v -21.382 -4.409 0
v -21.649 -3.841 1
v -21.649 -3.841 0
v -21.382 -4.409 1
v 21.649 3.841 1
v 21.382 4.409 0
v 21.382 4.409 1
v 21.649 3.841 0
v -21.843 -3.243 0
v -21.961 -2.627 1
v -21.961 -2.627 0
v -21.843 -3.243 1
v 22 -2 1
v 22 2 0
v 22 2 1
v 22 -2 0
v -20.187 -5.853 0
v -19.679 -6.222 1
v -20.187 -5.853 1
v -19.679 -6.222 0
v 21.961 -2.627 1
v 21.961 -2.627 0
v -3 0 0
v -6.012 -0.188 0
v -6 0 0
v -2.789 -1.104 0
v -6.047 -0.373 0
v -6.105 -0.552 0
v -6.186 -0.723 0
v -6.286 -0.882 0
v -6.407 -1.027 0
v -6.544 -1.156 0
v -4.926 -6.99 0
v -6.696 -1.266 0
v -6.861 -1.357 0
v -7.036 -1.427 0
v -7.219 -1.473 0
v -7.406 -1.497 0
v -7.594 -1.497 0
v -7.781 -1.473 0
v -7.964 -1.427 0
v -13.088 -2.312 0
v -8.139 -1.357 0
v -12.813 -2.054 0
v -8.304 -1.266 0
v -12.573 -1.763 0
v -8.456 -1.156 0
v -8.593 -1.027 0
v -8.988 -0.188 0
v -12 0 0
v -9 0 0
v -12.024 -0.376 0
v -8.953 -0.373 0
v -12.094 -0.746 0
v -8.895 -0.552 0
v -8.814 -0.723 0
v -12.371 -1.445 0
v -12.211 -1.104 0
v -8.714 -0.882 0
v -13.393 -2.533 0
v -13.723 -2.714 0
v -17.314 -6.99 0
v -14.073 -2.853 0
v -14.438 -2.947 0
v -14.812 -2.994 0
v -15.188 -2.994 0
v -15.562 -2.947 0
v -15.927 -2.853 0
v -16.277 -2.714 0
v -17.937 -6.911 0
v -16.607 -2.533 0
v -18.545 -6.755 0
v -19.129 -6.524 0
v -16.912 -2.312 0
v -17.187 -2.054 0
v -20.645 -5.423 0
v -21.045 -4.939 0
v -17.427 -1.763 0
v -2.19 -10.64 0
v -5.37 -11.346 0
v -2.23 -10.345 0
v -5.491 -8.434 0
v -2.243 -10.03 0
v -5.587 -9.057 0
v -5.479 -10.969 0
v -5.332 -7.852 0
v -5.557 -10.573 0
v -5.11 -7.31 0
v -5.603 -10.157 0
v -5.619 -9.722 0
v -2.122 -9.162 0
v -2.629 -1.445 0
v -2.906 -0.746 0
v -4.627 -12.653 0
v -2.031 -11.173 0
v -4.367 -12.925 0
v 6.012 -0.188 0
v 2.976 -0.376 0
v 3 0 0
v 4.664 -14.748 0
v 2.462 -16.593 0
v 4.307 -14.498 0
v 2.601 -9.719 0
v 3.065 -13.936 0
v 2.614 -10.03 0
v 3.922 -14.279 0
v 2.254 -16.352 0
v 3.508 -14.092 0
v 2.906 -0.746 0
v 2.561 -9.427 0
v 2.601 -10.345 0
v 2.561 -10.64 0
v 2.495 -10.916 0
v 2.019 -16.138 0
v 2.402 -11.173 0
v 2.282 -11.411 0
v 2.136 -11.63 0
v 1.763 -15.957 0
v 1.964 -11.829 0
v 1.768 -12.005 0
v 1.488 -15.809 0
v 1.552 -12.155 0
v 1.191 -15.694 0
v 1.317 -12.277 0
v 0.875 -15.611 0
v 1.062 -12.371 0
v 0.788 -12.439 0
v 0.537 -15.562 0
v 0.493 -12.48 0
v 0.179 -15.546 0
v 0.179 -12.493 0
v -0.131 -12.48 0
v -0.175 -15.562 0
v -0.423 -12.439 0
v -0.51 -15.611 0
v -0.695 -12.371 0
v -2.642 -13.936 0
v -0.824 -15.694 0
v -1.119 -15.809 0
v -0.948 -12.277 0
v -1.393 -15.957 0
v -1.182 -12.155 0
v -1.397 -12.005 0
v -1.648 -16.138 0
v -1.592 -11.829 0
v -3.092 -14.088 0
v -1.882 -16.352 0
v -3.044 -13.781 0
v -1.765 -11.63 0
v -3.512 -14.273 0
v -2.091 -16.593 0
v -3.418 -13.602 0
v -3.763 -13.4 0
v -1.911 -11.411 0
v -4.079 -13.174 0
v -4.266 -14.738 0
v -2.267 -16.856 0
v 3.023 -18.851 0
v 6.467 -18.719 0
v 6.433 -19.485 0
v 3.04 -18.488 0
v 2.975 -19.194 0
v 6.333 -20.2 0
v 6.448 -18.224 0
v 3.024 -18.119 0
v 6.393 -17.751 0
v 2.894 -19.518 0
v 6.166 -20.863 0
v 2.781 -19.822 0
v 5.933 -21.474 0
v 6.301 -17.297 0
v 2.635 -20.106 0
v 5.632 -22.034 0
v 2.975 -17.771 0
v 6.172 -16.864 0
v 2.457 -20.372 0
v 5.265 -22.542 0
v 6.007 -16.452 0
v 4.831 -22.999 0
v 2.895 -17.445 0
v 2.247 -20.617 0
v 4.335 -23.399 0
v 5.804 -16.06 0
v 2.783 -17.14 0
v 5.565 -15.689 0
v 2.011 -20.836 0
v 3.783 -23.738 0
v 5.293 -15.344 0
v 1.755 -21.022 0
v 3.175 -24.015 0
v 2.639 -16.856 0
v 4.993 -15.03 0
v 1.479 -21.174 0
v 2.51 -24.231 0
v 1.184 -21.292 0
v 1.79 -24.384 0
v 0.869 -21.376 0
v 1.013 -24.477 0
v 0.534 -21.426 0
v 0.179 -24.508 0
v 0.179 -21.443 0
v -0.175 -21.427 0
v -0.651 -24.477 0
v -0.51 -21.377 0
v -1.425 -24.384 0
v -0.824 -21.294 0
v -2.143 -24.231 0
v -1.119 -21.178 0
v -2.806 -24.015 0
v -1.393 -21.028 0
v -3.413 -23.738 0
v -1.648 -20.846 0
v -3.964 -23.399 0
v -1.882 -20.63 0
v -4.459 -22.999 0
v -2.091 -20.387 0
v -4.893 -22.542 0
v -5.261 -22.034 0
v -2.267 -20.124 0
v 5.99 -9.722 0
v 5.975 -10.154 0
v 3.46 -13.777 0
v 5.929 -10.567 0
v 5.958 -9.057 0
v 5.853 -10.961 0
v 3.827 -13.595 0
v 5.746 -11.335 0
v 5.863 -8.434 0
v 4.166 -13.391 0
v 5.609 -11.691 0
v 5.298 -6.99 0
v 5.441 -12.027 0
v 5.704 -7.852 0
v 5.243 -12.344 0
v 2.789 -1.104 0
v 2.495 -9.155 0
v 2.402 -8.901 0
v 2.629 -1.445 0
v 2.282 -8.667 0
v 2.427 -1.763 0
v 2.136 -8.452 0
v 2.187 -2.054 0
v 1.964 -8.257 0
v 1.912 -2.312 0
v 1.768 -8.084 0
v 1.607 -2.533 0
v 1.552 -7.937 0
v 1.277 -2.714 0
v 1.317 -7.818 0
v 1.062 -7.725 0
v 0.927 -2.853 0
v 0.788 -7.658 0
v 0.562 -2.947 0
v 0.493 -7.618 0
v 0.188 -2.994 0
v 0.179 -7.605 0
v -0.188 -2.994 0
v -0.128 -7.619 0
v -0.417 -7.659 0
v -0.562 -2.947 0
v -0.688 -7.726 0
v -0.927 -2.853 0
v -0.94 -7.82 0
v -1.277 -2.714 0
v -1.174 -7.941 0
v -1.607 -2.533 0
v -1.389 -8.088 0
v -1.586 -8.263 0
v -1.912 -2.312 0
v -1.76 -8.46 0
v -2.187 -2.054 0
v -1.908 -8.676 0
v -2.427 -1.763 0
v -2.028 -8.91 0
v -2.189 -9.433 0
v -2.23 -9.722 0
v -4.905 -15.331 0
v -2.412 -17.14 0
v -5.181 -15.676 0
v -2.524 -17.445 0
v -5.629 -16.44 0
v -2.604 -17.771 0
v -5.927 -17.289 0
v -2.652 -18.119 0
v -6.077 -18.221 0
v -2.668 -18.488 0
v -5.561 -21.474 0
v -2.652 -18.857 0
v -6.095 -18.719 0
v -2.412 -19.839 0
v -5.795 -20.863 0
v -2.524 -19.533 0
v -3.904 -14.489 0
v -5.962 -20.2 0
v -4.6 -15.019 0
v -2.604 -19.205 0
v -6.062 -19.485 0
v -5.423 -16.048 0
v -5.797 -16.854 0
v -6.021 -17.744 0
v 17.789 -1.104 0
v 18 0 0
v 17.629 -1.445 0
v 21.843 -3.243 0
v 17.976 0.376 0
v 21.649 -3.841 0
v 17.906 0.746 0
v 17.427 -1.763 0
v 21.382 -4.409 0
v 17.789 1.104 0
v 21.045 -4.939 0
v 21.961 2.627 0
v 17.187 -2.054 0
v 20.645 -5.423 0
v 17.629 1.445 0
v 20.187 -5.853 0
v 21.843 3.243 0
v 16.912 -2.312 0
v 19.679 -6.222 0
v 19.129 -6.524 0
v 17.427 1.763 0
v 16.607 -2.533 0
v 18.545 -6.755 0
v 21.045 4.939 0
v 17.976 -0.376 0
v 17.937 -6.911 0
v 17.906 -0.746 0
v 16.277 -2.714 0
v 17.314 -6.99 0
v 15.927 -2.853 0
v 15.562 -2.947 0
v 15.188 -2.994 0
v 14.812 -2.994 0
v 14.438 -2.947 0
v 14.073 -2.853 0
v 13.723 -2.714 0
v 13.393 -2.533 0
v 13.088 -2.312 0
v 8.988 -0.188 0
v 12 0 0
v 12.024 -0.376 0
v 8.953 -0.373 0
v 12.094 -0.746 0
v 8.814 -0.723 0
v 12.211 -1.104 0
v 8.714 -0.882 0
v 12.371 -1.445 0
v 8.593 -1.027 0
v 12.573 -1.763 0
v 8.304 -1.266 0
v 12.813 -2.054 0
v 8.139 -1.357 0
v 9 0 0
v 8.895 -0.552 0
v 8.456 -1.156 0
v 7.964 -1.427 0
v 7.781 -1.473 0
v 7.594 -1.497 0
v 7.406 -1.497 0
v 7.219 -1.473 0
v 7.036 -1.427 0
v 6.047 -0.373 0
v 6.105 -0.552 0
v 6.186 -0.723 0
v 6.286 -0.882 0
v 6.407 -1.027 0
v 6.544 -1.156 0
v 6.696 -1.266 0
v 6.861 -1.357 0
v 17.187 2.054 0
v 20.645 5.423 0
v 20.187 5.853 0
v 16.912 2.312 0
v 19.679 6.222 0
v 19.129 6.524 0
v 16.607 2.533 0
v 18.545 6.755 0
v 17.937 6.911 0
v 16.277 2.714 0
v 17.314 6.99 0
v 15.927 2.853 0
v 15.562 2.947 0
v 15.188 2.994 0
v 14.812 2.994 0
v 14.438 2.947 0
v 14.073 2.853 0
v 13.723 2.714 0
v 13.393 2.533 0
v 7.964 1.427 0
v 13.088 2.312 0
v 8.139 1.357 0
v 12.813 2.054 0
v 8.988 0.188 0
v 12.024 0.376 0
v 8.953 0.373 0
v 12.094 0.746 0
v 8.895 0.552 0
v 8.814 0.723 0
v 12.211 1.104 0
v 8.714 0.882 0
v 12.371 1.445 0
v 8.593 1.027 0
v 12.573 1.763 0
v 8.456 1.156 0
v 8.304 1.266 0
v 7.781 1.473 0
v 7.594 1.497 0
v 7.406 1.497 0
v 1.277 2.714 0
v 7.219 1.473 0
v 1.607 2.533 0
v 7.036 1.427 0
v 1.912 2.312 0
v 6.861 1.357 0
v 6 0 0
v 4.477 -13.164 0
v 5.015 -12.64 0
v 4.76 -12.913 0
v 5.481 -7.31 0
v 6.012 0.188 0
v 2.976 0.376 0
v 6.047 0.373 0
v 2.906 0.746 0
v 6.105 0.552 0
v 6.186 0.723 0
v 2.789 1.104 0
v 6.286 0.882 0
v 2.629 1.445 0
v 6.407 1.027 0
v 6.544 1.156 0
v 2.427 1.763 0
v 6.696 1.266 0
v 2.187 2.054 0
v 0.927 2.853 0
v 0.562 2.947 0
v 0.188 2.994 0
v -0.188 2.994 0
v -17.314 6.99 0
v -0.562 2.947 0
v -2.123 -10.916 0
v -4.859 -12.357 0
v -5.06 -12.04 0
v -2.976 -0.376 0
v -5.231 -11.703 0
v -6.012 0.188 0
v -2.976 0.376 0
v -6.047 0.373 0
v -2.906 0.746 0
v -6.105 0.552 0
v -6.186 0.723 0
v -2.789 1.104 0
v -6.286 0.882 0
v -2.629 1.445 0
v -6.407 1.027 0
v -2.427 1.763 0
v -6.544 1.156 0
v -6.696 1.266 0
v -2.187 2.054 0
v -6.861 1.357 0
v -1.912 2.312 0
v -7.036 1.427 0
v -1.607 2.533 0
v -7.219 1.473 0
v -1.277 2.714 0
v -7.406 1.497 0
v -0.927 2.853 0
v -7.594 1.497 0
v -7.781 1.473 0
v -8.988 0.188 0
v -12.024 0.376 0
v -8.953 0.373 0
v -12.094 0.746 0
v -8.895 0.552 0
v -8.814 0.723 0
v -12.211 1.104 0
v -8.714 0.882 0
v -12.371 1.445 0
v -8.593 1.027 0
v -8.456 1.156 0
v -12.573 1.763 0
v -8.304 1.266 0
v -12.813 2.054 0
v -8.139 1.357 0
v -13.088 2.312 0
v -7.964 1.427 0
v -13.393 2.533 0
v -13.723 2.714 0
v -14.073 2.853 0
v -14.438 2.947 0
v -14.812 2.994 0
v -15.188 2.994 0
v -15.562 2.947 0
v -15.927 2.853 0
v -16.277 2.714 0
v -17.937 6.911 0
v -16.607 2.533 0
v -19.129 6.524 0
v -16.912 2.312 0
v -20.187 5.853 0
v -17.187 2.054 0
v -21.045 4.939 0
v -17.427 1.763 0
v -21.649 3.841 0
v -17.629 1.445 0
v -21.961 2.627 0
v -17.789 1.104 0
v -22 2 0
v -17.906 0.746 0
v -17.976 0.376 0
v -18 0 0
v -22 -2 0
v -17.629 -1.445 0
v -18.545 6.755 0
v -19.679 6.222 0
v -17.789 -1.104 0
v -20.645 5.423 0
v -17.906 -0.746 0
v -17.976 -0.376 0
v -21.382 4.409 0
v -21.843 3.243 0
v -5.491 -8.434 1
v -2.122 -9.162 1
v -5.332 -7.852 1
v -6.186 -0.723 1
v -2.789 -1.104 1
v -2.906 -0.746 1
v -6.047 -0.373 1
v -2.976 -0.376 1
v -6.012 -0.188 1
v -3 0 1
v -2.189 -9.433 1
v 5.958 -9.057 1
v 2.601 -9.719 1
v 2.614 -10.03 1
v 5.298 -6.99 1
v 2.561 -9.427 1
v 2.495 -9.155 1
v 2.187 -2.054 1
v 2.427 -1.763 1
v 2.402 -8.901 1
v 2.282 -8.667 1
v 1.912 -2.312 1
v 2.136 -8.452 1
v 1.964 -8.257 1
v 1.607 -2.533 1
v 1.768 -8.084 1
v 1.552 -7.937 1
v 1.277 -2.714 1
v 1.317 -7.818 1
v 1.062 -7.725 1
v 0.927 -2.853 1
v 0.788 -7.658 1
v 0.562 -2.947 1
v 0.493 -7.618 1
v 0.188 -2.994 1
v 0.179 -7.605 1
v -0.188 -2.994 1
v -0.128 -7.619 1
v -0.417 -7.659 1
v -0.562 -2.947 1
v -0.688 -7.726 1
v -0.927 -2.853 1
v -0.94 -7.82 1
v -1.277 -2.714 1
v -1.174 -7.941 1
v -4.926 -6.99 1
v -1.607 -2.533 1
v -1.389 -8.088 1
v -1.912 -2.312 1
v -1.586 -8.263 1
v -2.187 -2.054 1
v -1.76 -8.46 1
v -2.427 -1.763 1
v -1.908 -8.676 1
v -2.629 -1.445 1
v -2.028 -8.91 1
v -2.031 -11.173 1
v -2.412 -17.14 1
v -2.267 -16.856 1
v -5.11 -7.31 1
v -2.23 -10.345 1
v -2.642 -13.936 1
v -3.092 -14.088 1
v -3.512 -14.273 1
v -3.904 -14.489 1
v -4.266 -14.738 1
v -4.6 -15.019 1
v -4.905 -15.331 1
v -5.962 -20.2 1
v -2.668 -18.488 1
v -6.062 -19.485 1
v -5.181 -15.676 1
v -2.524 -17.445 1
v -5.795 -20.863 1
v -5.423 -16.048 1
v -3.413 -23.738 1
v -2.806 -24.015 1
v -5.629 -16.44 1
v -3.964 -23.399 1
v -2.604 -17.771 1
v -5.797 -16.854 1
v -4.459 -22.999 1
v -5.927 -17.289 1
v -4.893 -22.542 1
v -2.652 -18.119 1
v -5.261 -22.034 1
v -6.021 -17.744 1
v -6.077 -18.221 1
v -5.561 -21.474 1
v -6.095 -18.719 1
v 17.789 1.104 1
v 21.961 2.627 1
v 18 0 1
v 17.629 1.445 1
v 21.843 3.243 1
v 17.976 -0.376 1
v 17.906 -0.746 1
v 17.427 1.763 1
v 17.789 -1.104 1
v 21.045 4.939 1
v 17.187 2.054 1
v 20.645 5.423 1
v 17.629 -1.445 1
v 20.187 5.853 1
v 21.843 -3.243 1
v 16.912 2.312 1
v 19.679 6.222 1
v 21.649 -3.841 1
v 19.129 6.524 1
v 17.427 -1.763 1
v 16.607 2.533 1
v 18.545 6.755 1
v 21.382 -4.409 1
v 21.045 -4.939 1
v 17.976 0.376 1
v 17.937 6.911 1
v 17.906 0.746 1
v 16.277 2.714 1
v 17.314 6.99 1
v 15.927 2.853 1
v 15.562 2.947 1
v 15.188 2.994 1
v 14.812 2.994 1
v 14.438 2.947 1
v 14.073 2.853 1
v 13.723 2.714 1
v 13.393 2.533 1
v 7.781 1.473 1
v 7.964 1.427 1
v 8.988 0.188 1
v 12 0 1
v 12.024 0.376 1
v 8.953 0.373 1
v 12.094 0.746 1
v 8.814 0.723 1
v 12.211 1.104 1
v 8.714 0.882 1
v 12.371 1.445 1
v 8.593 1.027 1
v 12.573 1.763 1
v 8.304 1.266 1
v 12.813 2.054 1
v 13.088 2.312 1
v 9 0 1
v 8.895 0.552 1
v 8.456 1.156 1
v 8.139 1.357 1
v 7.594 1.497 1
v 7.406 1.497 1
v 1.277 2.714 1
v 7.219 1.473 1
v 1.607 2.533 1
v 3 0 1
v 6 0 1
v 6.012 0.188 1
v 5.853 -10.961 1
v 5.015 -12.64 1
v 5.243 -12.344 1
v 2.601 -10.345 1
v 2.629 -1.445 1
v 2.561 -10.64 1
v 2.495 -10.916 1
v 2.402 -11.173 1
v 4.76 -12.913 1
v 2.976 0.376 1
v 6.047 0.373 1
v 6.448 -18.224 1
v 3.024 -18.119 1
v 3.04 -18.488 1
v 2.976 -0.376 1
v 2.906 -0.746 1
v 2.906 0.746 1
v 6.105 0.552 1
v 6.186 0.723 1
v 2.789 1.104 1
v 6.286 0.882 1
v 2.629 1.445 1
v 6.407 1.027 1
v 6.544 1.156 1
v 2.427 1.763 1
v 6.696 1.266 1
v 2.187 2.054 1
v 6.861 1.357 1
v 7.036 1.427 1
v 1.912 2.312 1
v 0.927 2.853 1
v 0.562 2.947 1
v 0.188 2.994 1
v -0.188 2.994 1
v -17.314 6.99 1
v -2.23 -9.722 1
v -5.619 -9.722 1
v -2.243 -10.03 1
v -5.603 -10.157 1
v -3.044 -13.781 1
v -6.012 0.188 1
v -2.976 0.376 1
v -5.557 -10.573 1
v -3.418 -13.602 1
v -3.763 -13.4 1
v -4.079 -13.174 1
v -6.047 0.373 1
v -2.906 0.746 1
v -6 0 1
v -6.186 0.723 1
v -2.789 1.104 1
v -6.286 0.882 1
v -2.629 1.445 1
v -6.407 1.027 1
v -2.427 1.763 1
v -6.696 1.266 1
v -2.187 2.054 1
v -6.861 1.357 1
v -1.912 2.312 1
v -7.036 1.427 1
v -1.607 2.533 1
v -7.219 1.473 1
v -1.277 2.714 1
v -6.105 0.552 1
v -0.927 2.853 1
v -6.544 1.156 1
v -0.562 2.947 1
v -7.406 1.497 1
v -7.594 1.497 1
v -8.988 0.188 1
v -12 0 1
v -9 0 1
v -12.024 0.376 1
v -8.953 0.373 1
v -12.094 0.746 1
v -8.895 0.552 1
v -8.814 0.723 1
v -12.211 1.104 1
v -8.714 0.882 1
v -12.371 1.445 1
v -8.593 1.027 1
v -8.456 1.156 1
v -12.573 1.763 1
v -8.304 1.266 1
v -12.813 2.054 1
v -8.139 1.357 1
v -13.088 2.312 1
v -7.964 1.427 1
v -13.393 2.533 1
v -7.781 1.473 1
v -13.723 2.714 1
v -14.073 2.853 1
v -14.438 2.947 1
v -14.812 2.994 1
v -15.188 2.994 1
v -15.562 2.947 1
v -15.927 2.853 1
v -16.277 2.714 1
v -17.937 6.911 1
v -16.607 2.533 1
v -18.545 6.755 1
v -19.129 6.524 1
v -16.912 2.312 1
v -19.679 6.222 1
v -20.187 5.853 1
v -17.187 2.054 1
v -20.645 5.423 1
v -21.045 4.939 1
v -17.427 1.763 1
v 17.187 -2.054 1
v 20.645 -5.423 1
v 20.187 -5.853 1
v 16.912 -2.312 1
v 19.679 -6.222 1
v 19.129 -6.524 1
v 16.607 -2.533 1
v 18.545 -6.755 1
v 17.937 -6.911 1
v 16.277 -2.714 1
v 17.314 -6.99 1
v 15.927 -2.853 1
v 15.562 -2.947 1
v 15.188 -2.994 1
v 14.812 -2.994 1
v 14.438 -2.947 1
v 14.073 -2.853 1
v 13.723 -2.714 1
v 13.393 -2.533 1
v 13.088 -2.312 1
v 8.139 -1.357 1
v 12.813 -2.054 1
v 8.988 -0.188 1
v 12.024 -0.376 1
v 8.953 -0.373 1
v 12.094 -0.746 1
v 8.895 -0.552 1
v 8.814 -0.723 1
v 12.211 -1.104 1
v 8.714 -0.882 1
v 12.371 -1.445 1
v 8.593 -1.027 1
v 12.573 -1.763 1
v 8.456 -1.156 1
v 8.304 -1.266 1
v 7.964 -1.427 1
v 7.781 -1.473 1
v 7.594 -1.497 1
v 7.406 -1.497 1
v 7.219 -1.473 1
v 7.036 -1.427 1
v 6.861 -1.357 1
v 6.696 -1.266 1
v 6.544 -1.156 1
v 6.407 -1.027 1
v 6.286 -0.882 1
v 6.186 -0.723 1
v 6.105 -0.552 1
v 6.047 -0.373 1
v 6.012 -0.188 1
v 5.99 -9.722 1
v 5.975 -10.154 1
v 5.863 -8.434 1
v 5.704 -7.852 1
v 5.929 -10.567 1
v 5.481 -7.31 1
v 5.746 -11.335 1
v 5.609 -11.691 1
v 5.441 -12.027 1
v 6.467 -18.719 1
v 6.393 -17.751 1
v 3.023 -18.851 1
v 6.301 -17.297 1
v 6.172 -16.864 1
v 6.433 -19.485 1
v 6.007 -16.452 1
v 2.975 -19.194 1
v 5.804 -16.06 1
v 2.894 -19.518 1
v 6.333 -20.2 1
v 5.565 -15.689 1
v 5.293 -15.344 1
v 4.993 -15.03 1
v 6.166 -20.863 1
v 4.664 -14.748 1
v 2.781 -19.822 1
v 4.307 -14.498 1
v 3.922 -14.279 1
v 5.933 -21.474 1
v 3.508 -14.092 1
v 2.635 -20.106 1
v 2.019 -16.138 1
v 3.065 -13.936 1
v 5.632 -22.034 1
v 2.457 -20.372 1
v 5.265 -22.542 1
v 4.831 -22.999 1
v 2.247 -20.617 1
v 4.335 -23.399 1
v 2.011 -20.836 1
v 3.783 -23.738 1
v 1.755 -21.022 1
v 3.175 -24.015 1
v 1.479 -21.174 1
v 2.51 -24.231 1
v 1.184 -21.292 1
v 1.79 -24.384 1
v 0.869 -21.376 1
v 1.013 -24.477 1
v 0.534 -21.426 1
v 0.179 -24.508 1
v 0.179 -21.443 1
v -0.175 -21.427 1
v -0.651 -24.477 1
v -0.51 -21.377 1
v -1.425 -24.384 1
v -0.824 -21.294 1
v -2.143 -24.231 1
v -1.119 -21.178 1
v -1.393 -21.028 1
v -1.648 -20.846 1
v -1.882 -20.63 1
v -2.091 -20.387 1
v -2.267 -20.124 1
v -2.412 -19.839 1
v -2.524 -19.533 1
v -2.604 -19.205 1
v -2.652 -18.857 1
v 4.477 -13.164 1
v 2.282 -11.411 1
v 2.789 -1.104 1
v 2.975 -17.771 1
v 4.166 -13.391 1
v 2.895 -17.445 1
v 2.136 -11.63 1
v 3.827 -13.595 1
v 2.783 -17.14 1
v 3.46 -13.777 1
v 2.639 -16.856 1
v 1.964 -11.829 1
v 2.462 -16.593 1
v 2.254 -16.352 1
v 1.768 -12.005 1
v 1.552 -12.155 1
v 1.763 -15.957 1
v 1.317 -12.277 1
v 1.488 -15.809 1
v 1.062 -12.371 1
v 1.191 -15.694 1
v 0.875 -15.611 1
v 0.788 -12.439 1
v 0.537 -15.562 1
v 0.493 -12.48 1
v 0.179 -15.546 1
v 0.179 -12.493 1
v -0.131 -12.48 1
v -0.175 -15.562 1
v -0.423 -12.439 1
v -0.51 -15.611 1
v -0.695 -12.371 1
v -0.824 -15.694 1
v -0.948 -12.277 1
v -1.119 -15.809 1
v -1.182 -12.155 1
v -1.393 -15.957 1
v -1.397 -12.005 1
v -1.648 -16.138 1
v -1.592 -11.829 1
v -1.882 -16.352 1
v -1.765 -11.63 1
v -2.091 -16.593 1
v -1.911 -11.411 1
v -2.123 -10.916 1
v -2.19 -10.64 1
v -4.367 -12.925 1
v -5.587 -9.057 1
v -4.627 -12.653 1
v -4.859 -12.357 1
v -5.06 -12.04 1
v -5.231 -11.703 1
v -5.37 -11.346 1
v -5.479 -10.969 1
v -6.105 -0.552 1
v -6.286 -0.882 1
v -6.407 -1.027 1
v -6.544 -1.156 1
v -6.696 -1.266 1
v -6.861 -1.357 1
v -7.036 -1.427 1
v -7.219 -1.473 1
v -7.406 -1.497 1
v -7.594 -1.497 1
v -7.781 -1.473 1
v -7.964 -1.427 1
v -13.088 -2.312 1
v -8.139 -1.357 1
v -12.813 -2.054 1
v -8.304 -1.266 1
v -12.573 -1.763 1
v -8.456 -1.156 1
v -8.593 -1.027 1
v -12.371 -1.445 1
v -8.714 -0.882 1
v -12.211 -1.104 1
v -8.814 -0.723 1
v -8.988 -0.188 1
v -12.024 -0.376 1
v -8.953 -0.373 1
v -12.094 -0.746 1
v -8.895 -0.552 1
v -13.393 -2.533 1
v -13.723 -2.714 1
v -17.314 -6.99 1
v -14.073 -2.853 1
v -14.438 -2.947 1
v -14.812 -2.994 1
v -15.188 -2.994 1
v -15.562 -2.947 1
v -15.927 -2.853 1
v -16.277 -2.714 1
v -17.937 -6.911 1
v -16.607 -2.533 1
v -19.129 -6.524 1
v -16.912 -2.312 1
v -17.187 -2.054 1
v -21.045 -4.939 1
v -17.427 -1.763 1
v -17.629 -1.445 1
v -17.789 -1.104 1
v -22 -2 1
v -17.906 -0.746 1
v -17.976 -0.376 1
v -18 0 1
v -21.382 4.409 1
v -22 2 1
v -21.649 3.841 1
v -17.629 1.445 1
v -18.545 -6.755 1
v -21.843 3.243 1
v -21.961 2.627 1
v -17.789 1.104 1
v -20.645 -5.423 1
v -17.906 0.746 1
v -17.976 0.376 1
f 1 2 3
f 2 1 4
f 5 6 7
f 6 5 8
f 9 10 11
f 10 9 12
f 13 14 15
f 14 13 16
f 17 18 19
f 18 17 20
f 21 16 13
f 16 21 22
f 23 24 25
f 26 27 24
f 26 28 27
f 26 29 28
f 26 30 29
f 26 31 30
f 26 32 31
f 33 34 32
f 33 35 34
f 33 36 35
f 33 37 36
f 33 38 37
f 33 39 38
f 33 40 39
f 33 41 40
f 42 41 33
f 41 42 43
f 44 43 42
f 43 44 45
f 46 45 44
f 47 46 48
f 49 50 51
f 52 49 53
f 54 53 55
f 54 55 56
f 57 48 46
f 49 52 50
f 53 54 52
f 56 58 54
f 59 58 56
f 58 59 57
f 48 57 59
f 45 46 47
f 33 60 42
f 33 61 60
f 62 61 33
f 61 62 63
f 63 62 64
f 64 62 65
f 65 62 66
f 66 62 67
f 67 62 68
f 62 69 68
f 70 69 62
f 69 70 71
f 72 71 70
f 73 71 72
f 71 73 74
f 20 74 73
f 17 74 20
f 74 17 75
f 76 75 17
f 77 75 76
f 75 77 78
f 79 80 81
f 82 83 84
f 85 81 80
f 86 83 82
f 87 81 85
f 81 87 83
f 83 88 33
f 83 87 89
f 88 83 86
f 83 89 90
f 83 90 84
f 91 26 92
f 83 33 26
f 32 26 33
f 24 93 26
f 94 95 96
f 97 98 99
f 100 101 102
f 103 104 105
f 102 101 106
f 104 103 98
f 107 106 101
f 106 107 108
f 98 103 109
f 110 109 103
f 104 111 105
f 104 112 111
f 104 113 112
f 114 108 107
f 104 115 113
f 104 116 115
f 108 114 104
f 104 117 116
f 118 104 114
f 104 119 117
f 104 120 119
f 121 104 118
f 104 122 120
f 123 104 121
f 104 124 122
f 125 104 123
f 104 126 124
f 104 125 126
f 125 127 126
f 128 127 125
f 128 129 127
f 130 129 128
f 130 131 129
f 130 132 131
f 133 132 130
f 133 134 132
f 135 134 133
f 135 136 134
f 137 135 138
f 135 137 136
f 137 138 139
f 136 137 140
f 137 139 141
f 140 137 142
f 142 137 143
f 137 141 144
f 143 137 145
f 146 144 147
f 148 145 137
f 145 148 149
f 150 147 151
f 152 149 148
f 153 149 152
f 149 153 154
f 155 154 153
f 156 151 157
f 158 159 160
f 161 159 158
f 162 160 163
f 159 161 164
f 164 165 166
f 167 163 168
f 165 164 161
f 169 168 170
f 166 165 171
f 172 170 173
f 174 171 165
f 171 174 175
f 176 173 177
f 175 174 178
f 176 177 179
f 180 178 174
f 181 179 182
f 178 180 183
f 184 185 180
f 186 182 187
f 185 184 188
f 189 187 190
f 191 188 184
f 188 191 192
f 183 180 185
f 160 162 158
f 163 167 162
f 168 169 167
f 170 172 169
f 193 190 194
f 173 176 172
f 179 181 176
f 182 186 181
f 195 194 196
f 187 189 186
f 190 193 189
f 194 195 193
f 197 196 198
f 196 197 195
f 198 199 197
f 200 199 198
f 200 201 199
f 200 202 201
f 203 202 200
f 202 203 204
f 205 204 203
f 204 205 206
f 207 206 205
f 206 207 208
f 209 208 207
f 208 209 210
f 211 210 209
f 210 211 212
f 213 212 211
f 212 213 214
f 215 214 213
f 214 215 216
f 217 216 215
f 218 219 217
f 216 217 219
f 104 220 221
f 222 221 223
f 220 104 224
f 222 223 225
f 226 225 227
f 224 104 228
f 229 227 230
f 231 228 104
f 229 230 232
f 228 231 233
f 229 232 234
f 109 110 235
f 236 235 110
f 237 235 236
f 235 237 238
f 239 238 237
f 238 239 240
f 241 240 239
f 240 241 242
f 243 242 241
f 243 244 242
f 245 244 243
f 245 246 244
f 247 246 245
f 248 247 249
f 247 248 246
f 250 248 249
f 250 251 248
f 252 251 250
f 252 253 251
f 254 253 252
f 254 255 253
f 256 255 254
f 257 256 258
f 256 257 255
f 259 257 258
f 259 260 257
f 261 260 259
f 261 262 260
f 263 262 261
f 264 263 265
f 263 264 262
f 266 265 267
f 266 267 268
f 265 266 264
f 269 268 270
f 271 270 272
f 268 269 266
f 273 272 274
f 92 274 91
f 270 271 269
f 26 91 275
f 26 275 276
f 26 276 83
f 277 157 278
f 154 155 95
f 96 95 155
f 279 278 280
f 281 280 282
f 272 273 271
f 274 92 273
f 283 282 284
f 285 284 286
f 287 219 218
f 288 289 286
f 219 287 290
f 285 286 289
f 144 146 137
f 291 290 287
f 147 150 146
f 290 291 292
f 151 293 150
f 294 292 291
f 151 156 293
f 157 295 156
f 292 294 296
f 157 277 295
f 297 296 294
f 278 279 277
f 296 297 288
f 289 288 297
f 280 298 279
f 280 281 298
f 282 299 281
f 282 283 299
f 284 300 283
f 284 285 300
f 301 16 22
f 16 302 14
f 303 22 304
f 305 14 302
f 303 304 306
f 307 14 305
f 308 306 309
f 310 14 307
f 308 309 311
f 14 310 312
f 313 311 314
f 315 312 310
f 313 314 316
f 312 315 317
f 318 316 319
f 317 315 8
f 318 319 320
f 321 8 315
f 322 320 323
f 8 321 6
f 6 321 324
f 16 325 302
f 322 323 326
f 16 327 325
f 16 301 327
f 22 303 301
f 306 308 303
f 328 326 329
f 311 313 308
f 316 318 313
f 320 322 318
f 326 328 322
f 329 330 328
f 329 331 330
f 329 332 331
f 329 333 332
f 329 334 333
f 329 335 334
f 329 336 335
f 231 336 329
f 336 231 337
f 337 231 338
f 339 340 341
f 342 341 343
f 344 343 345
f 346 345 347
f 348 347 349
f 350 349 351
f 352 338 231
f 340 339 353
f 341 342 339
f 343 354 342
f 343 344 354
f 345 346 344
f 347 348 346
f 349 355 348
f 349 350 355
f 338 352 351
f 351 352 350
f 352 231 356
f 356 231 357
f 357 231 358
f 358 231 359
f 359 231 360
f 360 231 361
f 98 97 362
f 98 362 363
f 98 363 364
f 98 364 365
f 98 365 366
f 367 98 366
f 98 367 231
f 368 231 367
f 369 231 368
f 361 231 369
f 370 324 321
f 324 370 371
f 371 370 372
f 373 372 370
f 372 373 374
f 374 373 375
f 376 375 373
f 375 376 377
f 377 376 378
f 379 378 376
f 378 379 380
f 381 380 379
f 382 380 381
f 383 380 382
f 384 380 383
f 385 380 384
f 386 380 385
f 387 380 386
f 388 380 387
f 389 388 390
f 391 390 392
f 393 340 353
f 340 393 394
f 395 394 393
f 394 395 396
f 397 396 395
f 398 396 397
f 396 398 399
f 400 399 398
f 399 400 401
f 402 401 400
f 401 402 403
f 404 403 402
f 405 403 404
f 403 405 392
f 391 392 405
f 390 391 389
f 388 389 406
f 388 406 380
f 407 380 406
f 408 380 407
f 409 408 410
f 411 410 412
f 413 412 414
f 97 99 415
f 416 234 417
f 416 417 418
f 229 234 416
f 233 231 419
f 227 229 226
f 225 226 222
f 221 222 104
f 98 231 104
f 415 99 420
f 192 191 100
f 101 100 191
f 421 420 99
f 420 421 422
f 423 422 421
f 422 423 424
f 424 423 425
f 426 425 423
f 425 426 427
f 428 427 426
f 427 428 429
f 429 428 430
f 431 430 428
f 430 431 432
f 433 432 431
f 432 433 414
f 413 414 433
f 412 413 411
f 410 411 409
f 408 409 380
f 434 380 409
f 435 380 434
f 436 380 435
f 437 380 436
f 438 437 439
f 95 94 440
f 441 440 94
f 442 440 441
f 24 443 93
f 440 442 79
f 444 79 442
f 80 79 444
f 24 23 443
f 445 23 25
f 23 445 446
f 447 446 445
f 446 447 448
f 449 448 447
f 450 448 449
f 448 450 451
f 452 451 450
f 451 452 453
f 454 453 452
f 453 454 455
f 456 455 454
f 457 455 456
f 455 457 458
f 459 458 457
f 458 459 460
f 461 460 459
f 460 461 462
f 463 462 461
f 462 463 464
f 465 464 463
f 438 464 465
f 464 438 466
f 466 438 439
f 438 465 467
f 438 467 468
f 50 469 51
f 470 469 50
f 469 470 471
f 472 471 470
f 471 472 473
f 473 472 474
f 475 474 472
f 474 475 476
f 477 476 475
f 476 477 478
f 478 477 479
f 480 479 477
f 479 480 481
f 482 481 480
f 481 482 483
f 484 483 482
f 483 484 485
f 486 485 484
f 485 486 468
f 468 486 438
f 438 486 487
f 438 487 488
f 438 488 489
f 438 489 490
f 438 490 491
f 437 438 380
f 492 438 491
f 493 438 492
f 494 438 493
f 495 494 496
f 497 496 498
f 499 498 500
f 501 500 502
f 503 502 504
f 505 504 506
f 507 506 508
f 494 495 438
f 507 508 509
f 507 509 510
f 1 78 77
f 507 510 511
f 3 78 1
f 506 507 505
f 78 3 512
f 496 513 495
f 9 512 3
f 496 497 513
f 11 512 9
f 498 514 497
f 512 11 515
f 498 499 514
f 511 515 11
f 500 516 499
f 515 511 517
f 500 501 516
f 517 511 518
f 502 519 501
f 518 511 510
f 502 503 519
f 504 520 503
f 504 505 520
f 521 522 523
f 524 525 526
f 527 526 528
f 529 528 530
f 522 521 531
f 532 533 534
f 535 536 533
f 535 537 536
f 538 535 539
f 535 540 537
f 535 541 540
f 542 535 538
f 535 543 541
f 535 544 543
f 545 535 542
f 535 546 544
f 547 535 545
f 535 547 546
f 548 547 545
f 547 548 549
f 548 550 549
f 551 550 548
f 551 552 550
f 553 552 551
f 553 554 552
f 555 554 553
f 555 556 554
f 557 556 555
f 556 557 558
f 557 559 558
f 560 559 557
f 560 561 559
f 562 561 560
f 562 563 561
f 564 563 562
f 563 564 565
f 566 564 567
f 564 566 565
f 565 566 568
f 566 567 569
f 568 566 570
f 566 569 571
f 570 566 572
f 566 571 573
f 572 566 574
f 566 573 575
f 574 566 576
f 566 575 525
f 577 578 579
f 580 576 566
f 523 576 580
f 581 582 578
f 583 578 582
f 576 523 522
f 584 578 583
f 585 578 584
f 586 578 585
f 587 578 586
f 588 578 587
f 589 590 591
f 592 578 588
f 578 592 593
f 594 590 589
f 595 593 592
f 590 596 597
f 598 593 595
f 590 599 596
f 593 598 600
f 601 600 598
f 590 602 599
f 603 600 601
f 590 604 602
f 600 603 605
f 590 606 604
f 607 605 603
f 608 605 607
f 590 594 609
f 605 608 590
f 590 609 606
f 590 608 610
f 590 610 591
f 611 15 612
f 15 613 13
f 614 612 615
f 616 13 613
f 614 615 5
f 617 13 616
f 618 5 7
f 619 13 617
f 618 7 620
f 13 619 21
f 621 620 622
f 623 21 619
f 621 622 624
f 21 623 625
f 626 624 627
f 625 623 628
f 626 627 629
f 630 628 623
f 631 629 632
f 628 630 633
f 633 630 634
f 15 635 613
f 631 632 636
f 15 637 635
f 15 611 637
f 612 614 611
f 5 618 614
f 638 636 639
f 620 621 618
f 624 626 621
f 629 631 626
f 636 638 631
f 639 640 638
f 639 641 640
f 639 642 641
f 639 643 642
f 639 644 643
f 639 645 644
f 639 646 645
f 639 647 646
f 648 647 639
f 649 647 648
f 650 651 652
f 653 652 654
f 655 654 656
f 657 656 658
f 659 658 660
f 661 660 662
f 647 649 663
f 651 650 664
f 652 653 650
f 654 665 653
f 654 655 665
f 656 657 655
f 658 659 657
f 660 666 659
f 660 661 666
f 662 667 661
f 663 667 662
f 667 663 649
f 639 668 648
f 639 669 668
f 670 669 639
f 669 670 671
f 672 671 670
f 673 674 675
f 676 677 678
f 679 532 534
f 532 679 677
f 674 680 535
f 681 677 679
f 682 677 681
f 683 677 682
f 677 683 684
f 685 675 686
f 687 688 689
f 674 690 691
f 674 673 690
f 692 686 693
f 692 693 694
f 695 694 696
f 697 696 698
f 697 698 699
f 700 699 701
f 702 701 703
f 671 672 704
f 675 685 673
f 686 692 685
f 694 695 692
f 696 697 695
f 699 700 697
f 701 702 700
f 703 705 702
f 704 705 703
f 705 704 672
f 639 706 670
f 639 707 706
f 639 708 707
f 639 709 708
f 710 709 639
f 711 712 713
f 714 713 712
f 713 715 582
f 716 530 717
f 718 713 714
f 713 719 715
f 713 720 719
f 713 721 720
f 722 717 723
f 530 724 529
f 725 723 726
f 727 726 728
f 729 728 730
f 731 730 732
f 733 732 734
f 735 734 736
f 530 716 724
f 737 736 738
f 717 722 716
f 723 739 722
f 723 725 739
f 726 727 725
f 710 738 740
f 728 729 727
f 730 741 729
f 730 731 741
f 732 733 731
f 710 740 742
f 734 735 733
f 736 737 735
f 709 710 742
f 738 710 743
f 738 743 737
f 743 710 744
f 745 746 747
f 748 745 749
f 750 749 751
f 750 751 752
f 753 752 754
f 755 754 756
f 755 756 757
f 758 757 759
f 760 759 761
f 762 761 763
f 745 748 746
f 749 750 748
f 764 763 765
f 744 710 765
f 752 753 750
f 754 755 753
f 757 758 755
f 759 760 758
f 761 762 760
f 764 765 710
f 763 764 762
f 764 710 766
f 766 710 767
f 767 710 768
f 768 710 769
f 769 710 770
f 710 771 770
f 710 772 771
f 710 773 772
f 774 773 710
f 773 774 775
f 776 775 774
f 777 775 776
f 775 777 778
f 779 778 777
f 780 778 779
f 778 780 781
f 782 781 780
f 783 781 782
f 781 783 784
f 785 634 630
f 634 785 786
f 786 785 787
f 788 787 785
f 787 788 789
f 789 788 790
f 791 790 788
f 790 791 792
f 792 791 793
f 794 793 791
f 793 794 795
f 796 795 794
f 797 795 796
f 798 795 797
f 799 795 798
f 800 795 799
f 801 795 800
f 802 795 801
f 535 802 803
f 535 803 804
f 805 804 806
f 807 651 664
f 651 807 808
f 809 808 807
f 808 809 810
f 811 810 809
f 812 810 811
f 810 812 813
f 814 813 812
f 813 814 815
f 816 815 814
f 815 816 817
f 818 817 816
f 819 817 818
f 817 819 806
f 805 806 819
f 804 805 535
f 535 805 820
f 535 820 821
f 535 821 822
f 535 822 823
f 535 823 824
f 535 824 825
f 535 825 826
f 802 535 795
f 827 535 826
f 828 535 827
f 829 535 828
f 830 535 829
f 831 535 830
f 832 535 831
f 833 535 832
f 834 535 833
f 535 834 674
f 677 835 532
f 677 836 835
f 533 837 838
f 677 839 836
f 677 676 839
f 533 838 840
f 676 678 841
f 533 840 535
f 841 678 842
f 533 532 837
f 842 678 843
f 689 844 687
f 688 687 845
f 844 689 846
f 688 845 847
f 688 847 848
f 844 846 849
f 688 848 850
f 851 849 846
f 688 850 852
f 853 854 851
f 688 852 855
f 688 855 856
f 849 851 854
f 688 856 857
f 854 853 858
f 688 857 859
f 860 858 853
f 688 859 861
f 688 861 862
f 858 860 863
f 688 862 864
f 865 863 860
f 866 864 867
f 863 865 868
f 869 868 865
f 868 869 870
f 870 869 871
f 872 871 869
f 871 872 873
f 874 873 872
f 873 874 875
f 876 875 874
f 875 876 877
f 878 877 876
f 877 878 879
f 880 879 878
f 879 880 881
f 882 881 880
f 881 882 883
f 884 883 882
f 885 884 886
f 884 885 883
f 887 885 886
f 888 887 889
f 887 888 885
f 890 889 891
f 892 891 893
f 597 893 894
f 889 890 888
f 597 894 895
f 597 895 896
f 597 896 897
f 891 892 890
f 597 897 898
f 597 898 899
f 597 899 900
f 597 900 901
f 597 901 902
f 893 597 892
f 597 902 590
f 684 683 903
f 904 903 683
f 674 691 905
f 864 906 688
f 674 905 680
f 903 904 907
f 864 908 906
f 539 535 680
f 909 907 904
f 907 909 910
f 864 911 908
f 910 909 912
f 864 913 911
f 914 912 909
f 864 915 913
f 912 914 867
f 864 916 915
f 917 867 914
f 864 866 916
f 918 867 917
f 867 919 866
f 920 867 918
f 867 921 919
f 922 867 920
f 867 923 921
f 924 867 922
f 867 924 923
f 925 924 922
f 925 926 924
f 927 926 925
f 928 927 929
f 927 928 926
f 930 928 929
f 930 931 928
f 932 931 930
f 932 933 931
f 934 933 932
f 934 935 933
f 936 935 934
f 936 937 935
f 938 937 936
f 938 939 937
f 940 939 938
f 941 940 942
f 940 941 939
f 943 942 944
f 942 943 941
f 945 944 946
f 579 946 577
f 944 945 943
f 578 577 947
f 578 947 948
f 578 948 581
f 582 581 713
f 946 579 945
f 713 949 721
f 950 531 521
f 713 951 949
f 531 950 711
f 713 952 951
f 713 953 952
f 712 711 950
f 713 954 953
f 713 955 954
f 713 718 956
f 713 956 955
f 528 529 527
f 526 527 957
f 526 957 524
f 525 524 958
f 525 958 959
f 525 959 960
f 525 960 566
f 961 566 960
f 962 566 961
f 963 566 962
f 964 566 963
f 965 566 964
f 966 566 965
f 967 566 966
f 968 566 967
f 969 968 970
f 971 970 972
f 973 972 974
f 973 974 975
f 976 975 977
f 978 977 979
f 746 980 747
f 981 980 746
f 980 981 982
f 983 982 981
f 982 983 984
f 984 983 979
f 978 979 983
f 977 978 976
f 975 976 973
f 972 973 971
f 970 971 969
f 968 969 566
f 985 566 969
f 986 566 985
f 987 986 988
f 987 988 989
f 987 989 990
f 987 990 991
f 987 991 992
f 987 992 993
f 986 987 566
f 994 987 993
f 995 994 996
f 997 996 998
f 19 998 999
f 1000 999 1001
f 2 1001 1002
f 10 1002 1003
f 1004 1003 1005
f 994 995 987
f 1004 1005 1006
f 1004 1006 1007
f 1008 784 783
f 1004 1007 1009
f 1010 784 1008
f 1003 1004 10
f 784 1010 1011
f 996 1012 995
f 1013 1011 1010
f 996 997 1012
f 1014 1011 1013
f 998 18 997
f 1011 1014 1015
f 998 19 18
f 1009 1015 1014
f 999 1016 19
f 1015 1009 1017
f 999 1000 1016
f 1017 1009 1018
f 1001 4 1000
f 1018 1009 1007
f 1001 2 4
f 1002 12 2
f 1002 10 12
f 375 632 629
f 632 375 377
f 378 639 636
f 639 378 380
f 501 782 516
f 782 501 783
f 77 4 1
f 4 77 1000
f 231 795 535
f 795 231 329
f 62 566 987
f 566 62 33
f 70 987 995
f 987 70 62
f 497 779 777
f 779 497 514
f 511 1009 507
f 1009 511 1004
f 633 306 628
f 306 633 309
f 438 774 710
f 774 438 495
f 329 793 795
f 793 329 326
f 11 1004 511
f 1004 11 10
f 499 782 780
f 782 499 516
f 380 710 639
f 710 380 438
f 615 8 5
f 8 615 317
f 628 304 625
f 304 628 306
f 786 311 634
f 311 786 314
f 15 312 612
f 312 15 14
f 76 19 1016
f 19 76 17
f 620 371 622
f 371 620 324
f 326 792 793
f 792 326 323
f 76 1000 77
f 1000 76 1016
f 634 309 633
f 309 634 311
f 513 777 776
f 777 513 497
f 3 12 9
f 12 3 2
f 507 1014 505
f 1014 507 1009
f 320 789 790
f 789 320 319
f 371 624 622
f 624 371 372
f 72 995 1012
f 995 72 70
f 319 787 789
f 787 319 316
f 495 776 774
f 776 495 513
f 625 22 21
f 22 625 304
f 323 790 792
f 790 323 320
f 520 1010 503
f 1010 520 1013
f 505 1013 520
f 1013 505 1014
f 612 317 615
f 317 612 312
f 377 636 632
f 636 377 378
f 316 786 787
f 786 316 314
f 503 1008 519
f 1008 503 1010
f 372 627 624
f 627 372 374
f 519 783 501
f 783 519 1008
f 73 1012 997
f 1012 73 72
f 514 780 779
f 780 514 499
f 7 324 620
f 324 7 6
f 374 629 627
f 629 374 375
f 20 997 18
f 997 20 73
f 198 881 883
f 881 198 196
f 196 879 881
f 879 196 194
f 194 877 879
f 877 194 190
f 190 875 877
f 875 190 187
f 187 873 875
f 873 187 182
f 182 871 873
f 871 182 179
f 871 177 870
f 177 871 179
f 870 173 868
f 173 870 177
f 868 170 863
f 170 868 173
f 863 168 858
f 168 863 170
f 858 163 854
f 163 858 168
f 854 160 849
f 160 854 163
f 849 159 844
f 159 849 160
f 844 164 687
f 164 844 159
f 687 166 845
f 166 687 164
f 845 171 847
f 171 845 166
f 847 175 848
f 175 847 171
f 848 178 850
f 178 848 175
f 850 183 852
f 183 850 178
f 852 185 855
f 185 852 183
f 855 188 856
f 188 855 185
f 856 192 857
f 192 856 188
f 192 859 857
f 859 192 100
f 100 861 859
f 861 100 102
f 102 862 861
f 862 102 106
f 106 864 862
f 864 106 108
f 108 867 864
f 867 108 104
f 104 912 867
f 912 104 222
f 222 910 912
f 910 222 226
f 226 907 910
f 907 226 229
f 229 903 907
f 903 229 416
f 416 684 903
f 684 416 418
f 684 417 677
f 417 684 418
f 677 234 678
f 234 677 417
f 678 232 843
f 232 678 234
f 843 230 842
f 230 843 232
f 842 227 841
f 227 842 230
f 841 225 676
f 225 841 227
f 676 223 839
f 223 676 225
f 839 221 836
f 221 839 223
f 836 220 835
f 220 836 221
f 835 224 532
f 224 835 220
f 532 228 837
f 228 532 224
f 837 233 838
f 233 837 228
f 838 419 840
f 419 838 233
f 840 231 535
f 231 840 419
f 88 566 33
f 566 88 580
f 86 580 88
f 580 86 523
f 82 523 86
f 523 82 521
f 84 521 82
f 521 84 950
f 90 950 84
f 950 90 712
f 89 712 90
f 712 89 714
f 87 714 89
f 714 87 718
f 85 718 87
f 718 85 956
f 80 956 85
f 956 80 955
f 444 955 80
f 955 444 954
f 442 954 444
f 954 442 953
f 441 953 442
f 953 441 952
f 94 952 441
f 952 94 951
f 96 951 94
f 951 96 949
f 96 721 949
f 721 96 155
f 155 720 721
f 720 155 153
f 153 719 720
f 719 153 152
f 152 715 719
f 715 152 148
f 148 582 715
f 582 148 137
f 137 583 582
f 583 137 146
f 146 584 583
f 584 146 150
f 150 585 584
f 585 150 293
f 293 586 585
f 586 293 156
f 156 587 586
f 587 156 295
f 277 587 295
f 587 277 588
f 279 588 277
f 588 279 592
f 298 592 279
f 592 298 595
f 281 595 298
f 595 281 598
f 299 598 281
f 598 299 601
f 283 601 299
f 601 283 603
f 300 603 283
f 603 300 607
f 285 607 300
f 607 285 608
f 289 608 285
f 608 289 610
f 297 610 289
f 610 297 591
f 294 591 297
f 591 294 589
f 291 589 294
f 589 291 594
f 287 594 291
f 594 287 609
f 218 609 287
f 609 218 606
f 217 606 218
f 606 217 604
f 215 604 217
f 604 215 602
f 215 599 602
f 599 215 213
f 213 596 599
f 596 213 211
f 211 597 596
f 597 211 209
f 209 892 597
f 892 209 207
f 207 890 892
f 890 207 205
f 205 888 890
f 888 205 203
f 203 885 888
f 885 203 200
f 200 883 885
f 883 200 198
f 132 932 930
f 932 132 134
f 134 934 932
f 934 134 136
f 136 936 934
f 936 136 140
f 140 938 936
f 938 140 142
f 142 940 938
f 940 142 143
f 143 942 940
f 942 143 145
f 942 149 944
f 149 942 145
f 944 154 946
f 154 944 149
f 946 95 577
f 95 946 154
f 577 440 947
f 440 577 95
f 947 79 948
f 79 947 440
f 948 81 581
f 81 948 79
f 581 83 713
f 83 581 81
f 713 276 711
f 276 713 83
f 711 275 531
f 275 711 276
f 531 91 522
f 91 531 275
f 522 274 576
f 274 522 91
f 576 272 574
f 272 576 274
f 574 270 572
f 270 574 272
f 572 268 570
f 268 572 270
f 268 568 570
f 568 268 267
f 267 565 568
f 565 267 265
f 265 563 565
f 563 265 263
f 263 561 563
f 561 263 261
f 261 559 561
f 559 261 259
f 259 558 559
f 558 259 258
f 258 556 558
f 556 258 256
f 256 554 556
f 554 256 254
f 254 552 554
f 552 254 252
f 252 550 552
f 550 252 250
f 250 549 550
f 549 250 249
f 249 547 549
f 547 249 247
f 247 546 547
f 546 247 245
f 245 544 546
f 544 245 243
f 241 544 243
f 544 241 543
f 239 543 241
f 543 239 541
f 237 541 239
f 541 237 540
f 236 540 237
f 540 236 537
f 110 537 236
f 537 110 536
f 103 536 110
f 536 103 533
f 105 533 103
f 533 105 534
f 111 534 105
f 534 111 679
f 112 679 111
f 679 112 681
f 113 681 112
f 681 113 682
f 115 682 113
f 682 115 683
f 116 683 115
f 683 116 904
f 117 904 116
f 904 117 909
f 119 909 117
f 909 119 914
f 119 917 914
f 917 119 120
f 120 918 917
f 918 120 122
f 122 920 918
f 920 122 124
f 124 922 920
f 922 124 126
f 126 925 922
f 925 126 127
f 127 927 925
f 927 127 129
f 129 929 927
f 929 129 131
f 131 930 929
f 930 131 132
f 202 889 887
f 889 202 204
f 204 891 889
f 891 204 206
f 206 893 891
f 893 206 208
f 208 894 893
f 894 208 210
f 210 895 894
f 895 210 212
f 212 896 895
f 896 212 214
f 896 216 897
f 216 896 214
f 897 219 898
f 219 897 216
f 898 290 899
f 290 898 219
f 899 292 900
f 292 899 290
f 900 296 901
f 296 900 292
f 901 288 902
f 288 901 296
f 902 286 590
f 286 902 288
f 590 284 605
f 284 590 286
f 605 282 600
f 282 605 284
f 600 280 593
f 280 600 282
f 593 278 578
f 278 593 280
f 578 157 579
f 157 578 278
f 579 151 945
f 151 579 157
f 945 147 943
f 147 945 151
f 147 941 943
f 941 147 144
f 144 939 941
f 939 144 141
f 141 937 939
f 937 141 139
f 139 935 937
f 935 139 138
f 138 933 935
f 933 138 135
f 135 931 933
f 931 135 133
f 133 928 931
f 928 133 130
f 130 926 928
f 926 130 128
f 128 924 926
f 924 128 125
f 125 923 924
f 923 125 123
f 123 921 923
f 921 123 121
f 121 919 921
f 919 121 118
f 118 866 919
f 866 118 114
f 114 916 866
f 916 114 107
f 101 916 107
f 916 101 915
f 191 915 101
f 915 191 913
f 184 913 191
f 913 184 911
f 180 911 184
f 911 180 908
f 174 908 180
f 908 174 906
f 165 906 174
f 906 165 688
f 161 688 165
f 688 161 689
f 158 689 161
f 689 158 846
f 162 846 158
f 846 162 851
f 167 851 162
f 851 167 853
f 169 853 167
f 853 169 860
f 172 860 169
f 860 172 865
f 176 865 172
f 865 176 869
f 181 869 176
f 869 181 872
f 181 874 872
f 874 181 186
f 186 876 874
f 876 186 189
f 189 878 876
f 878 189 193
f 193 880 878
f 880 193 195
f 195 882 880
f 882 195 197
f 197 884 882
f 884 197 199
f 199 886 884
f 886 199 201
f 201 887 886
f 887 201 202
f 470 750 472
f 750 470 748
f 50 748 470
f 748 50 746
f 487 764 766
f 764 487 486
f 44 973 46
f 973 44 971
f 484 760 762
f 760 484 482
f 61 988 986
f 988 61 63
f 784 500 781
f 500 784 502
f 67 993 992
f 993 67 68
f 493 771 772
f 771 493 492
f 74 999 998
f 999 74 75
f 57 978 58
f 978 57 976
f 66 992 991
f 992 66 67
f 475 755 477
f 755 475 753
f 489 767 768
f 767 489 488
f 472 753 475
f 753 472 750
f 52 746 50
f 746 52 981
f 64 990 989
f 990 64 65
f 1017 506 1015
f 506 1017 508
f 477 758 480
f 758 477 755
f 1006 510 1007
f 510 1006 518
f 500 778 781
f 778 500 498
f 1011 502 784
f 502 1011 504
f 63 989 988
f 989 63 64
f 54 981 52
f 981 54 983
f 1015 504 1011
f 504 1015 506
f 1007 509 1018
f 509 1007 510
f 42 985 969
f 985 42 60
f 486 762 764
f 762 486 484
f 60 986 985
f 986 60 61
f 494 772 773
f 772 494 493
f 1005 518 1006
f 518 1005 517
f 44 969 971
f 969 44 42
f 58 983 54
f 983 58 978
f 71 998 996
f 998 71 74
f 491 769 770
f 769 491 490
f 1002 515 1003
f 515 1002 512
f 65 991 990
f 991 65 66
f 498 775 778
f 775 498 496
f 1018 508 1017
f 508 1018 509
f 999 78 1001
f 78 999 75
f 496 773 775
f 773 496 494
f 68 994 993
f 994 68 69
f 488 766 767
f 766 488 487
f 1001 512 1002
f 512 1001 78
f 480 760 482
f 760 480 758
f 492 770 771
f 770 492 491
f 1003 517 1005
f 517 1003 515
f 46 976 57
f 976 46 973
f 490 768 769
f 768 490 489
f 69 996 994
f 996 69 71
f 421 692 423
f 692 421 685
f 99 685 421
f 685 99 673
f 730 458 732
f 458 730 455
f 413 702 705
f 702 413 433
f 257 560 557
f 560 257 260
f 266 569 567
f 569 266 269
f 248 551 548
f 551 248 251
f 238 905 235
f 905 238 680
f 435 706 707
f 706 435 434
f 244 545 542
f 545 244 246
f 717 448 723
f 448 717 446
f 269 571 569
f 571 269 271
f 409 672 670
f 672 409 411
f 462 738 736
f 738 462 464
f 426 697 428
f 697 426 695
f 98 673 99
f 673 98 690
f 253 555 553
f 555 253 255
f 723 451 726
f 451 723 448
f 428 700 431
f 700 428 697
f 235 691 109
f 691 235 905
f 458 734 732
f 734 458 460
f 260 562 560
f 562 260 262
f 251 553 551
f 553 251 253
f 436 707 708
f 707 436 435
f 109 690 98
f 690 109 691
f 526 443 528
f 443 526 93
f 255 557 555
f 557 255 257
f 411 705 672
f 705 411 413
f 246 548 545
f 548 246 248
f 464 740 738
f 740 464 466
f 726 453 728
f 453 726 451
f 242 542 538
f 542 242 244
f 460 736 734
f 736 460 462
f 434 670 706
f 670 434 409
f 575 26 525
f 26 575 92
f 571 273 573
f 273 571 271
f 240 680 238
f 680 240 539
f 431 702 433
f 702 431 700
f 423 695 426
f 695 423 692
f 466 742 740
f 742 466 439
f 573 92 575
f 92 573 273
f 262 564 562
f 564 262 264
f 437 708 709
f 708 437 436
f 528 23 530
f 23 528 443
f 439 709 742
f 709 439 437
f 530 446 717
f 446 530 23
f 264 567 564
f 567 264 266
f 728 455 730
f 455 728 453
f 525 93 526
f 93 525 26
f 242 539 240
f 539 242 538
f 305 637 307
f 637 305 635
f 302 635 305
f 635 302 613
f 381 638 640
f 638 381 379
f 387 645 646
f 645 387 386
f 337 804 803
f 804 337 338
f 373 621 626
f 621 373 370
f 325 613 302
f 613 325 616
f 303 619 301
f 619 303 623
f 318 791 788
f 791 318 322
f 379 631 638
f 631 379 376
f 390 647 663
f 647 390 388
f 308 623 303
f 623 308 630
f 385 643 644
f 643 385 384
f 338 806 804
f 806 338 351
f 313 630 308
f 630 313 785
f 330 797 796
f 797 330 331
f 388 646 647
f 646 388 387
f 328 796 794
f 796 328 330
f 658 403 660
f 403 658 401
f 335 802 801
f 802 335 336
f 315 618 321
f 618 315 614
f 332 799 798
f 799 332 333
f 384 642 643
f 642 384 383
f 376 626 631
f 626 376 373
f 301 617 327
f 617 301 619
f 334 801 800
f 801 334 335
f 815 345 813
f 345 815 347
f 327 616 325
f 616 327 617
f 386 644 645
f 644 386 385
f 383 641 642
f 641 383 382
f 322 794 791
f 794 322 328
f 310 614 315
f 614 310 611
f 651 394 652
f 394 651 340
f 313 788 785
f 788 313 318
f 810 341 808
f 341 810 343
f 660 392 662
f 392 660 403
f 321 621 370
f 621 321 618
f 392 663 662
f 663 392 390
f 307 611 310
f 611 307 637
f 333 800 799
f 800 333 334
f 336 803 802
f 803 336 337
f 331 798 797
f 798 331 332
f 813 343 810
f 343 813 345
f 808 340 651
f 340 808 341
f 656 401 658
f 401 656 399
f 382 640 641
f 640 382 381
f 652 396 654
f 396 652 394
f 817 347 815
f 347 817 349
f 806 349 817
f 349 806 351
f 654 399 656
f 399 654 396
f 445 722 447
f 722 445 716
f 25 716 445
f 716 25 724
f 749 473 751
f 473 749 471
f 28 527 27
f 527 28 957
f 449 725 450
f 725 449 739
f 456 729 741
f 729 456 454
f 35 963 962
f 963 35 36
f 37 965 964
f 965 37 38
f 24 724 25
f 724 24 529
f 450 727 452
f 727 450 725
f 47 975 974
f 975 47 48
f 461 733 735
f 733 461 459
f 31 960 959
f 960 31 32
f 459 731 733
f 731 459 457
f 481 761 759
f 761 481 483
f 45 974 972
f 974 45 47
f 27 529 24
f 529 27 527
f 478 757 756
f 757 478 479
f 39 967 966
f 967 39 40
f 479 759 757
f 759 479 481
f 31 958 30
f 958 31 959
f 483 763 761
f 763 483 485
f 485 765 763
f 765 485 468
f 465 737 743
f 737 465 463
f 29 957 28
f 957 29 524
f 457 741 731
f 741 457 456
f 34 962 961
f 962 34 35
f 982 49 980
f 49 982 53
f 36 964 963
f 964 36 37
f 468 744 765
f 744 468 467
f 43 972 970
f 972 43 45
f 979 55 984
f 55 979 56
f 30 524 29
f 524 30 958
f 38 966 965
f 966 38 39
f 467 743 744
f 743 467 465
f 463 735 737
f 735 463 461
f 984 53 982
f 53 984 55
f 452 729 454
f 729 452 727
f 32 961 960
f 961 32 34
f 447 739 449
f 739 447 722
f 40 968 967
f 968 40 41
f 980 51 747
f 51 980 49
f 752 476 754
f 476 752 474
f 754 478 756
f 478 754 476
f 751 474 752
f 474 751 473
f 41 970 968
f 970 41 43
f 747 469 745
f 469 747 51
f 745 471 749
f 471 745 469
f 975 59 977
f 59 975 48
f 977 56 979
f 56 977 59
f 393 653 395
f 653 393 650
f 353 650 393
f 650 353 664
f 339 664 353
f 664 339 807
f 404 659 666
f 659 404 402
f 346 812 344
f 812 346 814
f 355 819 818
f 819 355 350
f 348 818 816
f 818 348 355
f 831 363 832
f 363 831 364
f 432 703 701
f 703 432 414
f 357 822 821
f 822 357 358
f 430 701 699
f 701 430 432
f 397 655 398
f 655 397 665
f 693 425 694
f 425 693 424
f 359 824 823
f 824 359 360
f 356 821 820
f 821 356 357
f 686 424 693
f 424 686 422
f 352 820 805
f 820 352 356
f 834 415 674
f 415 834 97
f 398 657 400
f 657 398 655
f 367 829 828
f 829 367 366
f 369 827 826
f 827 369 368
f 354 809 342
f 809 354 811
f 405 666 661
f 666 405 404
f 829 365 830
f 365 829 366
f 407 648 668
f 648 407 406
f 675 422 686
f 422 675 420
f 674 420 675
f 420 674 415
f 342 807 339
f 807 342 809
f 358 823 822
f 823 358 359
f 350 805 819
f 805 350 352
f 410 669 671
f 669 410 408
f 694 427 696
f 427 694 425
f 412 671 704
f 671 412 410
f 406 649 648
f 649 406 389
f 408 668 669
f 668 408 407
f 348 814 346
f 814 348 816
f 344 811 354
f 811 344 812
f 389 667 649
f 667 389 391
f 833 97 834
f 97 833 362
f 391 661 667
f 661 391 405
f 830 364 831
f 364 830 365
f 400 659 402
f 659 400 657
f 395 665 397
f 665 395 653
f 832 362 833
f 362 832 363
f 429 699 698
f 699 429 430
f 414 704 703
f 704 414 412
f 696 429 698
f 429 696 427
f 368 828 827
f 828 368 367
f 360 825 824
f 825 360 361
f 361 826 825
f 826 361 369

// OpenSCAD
$fn = 50;


difference() {
	union() {
		*color(alpha = 1.0000000000, c = "gray") {
			translate(v = [0, 14, 0]) {
				linear_extrude(height = 1) {
					text(font = "Arial:style=Bold", halign = "center", size = 4.5000000000, text = "COMMENT description oobb_plate_shape_p_type_1_depth_3_width_1_thickness_8_extra_oobb_size", valign = "center");
				}
			}
		}
		hull() {
			translate(v = [-17.0000000000, 2.0000000000, 0]) {
				cylinder(h = 1, r = 5);
			}
			translate(v = [17.0000000000, 2.0000000000, 0]) {
				cylinder(h = 1, r = 5);
			}
			translate(v = [-17.0000000000, -2.0000000000, 0]) {
				cylinder(h = 1, r = 5);
			}
			translate(v = [17.0000000000, -2.0000000000, 0]) {
				cylinder(h = 1, r = 5);
			}
		}
		translate(v = [0, -5, 0]) {
			linear_extrude(height = 1) {
				text(font = "DejaVu Sans Mono:style=Bold", halign = "center", size = 19.0000000000, text = "8", valign = "top");
			}
		}
	}
	union() {
		*color(alpha = 1.0000000000, c = "gray") {
			translate(v = [0, 14, 0]) {
				linear_extrude(height = 1) {
					text(font = "Arial:style=Bold", halign = "center", size = 4.5000000000, text = "COMMENT description oobb_holes_shape_n_type_3_width_1_thickness_8_extra_oobb_size_1_height_'all'_holes_true_both_holes", valign = "center");
				}
			}
		}
		translate(v = [-15.0000000000, 0.0000000000, 0]) {
			translate(v = [0, 0, -50]) {
				cylinder(h = 100, r = 3.0000000000);
			}
		}
		translate(v = [0, 0, -50]) {
			cylinder(h = 100, r = 3.0000000000);
		}
		translate(v = [15.0000000000, 0.0000000000, 0]) {
			translate(v = [0, 0, -50]) {
				cylinder(h = 100, r = 3.0000000000);
			}
		}
		translate(v = [-15.0000000000, 0.0000000000, 0]) {
			translate(v = [0, 0, -50]) {
				cylinder(h = 100, r = 1.5000000000);
			}
		}
		translate(v = [-7.5000000000, 0.0000000000, 0]) {
			translate(v = [0, 0, -50]) {
				cylinder(h = 100, r = 1.5000000000);
			}
		}
		translate(v = [0, 0, -50]) {
			cylinder(h = 100, r = 1.5000000000);
		}
		translate(v = [7.5000000000, 0.0000000000, 0]) {
			translate(v = [0, 0, -50]) {
				cylinder(h = 100, r = 1.5000000000);
			}
		}
		translate(v = [15.0000000000, 0.0000000000, 0]) {
			translate(v = [0, 0, -50]) {
				cylinder(h = 100, r = 1.5000000000);
			}
		}
	}
}
